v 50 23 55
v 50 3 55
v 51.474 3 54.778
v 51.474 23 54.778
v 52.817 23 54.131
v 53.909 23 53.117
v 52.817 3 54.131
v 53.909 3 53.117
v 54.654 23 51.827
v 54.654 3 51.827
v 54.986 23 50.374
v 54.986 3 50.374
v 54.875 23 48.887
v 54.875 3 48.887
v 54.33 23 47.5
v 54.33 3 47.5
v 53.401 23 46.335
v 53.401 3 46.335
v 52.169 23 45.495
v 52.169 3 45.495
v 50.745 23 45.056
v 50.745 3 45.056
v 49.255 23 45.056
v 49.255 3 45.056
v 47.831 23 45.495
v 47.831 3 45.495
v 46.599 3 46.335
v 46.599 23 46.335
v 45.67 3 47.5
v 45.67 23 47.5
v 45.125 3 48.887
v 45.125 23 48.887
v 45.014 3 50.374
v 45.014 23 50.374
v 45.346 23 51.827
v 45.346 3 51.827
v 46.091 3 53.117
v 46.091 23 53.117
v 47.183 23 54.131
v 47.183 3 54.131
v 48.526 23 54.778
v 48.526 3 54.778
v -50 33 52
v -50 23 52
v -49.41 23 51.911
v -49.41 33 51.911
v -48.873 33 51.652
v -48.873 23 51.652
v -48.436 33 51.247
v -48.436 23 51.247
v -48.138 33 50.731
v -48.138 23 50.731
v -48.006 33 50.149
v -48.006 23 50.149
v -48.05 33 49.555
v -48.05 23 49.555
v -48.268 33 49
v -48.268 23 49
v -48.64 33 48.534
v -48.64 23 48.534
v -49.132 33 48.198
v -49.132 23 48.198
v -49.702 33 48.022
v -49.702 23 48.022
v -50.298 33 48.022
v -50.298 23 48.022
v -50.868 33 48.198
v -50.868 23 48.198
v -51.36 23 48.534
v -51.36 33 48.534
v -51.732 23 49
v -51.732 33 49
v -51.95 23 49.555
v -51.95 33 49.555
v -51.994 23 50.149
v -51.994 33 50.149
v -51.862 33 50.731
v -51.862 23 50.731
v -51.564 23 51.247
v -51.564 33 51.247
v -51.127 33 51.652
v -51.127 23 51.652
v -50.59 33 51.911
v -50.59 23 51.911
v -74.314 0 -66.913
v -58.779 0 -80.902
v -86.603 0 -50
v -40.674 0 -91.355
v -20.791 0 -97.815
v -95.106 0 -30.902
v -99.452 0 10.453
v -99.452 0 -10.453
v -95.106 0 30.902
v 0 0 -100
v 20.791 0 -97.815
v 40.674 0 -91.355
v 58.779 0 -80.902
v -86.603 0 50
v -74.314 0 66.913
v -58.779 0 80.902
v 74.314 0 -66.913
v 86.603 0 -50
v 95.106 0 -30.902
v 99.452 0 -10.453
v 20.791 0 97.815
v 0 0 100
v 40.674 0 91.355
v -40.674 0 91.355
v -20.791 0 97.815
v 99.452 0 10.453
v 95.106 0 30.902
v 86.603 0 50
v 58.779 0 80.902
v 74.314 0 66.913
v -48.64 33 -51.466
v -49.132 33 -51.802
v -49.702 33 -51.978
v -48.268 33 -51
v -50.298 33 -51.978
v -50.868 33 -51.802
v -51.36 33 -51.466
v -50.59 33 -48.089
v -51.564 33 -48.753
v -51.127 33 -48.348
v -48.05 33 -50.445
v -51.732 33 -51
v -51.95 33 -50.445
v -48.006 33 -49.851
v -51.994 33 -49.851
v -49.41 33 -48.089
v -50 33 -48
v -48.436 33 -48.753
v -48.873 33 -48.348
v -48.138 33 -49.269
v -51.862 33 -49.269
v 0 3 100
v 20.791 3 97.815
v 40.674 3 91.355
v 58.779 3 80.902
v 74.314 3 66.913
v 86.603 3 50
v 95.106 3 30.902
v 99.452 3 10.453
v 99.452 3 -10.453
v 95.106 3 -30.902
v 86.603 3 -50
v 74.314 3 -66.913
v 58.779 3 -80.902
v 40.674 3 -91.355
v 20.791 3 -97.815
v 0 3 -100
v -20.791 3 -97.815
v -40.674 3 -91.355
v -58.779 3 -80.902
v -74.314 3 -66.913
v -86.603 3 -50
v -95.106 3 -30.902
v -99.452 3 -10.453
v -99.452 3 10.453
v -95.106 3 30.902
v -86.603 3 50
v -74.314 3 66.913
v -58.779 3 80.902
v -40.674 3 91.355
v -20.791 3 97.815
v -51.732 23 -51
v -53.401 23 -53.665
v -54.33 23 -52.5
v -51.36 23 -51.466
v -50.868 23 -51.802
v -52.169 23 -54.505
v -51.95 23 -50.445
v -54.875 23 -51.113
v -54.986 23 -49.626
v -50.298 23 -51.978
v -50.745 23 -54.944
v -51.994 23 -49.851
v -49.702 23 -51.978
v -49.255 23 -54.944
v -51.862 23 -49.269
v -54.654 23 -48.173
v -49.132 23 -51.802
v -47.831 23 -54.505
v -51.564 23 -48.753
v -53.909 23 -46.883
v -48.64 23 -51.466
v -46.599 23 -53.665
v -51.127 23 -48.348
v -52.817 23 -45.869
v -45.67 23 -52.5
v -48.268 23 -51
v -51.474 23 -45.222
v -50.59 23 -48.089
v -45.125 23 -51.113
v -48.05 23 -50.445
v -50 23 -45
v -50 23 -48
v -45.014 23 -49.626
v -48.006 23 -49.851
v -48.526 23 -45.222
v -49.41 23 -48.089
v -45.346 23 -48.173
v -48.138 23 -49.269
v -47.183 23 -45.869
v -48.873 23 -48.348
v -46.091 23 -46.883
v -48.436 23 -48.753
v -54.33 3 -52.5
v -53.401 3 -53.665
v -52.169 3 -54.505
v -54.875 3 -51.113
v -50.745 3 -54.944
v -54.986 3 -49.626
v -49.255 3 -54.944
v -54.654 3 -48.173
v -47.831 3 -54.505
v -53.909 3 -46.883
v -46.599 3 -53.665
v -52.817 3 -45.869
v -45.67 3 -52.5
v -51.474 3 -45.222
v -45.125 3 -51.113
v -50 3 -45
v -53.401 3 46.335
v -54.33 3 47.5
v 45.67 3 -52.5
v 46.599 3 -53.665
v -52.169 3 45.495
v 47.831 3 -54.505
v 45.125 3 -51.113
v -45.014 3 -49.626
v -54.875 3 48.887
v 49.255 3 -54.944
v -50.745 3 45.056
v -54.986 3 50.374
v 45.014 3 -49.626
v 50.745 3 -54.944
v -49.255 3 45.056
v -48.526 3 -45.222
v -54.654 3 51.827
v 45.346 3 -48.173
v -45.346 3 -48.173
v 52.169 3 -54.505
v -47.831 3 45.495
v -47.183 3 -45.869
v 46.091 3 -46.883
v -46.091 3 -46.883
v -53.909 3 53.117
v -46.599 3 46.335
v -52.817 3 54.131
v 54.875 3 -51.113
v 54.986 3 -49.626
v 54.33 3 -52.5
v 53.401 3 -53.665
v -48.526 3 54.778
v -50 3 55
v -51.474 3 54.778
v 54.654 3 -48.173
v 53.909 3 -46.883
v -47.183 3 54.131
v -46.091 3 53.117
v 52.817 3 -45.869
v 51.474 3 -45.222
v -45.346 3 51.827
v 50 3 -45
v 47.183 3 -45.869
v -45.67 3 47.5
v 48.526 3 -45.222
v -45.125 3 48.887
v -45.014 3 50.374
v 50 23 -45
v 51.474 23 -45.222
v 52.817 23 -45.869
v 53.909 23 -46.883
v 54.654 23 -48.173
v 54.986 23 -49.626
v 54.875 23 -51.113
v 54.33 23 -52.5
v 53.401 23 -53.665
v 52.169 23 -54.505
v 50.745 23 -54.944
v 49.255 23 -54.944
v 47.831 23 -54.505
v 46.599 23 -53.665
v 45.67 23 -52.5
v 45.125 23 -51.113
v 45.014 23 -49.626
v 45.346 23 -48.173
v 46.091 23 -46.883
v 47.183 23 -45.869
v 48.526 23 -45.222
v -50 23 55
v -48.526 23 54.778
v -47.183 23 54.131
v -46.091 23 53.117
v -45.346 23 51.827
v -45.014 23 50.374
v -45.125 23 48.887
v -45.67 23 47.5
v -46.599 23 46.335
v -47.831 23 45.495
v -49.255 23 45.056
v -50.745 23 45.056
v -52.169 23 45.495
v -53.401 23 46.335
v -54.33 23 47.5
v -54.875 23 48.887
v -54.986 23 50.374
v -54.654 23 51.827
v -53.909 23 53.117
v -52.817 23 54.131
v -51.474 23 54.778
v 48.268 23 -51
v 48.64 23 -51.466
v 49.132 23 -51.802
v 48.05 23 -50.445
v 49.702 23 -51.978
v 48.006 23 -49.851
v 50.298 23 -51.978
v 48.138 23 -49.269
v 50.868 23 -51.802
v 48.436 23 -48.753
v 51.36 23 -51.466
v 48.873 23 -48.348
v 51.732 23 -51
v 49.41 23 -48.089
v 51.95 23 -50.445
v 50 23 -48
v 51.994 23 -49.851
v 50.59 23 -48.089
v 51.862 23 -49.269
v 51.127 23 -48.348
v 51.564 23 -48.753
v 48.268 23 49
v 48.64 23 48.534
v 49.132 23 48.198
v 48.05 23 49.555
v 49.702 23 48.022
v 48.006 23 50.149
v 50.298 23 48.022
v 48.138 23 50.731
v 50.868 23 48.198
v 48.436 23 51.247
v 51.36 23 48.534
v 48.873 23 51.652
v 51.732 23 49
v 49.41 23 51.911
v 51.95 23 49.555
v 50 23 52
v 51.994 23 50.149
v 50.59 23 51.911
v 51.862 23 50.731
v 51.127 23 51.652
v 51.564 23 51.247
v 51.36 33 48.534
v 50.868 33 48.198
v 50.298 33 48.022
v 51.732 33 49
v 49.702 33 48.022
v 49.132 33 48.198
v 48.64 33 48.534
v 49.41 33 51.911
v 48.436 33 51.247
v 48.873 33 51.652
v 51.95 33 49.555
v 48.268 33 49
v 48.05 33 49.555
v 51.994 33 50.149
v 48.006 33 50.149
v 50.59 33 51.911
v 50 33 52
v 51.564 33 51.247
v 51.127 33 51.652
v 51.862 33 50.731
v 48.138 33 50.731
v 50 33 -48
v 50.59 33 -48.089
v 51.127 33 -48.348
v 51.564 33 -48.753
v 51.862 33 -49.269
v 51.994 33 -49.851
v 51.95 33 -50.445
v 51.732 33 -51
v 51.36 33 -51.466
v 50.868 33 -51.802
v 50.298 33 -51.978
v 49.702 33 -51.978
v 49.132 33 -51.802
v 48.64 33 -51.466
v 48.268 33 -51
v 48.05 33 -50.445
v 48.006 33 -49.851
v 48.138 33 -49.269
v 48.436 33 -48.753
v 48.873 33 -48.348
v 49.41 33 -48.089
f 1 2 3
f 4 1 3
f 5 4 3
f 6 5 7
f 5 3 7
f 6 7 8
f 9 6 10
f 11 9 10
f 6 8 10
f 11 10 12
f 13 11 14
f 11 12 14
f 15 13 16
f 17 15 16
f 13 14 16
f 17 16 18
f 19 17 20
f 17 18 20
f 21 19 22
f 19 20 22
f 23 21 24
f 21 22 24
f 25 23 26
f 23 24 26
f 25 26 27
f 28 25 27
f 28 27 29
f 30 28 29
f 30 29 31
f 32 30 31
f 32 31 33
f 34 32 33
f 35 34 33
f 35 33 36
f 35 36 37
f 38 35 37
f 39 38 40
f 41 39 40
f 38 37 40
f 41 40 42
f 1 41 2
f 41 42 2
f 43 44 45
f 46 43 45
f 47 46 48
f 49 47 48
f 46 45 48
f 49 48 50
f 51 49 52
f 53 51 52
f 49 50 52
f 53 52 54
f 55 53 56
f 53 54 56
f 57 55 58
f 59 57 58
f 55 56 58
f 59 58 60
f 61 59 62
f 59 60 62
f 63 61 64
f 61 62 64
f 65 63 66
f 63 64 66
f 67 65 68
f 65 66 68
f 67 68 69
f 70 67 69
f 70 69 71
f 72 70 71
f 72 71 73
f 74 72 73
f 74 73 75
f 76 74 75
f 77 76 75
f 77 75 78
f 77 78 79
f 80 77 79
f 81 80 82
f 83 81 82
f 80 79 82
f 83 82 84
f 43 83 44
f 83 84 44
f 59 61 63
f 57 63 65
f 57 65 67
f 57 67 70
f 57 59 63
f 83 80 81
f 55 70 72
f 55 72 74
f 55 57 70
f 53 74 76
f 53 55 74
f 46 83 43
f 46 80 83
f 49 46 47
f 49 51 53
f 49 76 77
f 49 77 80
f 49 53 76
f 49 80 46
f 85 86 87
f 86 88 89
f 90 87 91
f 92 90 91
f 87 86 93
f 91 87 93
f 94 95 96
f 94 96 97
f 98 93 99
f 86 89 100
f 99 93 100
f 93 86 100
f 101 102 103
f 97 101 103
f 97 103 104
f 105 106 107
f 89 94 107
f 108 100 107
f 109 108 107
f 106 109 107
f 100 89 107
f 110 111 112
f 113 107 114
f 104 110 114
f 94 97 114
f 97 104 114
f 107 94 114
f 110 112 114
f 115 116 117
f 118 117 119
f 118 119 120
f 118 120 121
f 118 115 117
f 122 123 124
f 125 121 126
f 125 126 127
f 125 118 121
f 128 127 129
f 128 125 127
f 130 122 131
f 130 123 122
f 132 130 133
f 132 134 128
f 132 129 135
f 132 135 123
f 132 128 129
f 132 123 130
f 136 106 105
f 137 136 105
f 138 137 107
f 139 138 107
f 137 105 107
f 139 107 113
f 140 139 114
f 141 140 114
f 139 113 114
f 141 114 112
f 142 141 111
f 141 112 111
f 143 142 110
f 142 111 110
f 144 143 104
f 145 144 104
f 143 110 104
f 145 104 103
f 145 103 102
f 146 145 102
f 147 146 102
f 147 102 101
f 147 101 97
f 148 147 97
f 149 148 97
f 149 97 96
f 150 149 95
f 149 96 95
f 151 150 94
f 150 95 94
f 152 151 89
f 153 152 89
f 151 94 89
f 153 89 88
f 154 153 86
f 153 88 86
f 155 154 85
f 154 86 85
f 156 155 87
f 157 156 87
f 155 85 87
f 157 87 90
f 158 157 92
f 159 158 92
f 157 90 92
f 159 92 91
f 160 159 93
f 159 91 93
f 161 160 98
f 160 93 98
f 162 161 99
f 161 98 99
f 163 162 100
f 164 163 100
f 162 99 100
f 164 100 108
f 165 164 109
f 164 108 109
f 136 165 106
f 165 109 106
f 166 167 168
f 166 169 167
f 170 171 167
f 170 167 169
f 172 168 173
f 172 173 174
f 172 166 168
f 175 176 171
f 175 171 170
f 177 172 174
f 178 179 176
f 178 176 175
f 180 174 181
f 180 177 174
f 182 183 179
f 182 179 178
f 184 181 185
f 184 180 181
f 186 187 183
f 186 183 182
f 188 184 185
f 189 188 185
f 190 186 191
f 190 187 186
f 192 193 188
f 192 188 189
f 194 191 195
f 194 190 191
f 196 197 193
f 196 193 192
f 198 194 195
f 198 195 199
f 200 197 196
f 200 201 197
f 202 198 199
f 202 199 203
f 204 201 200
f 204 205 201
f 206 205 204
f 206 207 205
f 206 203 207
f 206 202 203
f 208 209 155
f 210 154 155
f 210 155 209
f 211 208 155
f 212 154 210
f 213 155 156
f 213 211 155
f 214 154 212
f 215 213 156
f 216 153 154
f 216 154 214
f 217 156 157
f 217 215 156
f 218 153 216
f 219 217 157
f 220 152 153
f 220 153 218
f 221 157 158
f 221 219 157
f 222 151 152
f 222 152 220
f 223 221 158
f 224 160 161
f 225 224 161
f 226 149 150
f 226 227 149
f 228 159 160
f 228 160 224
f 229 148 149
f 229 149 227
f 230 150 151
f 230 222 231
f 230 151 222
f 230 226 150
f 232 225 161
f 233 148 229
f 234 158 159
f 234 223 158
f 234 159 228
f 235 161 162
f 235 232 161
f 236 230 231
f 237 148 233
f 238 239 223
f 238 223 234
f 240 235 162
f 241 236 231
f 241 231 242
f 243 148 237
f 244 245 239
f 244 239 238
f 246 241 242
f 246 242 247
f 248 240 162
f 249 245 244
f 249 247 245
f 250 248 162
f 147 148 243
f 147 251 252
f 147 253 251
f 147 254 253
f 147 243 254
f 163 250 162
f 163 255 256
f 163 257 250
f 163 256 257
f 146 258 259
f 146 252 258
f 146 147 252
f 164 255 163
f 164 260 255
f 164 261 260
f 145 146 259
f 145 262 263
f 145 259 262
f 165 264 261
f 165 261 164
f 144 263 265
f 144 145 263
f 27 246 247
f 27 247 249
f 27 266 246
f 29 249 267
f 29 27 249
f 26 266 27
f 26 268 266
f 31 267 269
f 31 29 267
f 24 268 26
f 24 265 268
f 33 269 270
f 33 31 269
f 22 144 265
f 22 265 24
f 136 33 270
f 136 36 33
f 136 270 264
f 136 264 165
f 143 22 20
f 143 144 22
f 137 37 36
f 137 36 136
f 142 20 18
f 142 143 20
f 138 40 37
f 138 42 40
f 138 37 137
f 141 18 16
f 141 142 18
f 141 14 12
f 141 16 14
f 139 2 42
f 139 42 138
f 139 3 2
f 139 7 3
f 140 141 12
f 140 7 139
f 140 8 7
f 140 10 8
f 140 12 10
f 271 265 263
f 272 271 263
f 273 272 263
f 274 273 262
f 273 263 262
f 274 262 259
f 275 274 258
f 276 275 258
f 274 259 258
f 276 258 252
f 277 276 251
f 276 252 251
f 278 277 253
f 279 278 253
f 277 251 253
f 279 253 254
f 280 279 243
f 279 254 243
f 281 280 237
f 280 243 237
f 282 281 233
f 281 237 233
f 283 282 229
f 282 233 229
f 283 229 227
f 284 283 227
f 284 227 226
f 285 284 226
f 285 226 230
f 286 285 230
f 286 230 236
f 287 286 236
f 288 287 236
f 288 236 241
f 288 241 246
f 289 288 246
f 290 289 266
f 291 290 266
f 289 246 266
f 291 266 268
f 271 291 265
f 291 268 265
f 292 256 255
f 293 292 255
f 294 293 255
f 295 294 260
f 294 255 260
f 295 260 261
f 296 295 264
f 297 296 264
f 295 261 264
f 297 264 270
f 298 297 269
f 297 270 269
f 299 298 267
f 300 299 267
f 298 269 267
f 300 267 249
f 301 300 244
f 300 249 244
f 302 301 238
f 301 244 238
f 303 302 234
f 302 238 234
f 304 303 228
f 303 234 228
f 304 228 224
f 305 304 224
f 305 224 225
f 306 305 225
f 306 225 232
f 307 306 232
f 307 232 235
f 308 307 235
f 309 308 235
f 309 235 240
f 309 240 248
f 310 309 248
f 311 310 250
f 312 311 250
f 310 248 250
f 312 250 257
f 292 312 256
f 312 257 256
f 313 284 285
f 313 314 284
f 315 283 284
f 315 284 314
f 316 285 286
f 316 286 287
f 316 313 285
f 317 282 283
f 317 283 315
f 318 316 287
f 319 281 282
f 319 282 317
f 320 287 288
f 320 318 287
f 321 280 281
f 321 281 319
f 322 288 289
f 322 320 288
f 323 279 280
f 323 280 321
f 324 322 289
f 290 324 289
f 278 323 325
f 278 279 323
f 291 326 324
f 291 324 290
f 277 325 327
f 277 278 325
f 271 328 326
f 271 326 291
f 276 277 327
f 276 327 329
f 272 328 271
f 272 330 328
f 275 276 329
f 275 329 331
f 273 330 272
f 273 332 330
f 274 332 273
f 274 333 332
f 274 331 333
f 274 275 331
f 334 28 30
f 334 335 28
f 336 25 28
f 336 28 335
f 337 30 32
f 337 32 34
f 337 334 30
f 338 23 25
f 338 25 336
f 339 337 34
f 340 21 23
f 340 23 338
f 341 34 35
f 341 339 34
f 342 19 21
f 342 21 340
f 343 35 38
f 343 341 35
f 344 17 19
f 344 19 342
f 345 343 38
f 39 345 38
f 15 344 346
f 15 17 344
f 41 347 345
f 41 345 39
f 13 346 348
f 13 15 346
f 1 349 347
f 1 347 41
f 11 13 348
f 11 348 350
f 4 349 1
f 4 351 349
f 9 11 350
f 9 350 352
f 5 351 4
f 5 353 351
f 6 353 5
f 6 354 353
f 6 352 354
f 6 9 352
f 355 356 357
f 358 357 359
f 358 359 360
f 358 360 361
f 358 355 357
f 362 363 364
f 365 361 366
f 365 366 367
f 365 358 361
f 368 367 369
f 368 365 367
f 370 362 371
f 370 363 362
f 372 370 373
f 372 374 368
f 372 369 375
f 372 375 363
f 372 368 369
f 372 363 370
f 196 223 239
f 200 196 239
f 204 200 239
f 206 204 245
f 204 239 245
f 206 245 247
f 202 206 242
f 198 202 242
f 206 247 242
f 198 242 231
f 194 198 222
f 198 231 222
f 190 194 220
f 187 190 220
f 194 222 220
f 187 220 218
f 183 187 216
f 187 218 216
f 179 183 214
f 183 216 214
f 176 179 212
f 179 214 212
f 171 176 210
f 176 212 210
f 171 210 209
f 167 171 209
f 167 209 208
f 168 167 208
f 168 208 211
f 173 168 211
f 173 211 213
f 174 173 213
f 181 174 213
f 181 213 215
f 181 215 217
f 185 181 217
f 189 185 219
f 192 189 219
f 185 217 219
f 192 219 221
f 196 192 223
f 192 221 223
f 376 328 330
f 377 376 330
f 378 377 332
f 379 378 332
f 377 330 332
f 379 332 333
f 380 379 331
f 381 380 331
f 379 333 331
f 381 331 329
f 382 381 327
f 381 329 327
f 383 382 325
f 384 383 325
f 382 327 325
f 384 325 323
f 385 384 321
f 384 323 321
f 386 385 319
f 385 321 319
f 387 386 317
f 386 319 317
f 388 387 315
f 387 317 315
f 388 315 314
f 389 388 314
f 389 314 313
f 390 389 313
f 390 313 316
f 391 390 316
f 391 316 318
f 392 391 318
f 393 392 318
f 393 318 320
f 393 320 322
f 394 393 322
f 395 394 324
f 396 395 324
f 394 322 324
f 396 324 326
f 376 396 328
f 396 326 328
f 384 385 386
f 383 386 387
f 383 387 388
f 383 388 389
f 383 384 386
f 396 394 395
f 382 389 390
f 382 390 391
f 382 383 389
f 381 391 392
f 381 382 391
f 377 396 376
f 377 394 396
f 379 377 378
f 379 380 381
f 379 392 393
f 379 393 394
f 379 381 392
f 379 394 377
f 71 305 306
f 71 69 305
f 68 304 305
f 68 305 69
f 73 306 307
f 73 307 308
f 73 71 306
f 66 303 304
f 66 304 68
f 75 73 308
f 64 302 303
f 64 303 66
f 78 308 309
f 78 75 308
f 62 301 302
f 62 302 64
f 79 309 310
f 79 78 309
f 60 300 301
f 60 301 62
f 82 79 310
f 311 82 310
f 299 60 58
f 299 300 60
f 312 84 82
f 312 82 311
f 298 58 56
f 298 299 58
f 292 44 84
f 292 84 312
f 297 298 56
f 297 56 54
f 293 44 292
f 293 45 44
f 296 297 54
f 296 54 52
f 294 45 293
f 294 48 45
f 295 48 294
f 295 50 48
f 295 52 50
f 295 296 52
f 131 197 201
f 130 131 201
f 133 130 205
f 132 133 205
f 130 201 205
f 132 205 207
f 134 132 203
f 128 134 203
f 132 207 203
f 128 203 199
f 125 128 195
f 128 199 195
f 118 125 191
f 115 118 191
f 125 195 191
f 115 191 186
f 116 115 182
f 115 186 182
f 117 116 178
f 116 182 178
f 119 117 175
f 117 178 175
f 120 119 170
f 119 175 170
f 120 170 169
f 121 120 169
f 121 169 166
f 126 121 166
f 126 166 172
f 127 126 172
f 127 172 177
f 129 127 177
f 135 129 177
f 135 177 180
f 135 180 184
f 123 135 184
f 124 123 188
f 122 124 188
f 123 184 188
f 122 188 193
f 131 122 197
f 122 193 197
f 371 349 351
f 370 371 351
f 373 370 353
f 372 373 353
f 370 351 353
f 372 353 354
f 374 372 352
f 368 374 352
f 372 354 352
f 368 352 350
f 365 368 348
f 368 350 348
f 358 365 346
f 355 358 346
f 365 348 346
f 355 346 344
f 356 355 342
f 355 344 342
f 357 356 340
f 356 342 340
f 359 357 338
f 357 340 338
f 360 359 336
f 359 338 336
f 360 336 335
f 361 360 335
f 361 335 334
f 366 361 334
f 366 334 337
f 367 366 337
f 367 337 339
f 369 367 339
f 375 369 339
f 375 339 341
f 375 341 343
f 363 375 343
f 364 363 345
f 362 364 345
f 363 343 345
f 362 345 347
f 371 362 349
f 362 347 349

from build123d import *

# Parameters (mm, degrees)
SKETCH3_R           = 100
BOSS_EXTRUDE1_DEPTH = 3
SKETCH4_R           = 5
BOSS_EXTRUDE2_DEPTH = 20
SKETCH5_R           = 2
BOSS_EXTRUDE3_DEPTH = 10


with BuildPart() as part:
    # Sketch3 → Boss-Extrude1 (new body)
    with BuildSketch(Plane(origin=(0, 0, 0), x_dir=(1, 0, 0), z_dir=(0, 1, 0))):
        with Locations(Location((0, 0, 0), (0, 0, 270))):
            Circle(SKETCH3_R)
    extrude(amount=BOSS_EXTRUDE1_DEPTH)

    # Sketch4 → Boss-Extrude2 (add)
    with BuildSketch(Plane(origin=(0, 3, 0), x_dir=(1, 0, 0), z_dir=(0, 1, 0))):
        with Locations(Location((-50, 50, 0), (0, 0, 270))):
            Circle(SKETCH4_R)
        with Locations(Location((50, 50, 0), (0, 0, 270))):
            Circle(SKETCH4_R)
        with Locations(Location((50, -50, 0), (0, 0, 270))):
            Circle(SKETCH4_R)
        with Locations(Location((-50, -50, 0), (0, 0, 270))):
            Circle(SKETCH4_R)
    extrude(amount=BOSS_EXTRUDE2_DEPTH)

    # Sketch5 → Boss-Extrude3 (add)
    with BuildSketch(Plane(origin=(0, 23, 0), x_dir=(1, 0, 0), z_dir=(0, 1, 0))):
        with Locations(Location((50, -50, 0), (0, 0, 270))):
            Circle(SKETCH5_R)
        with Locations(Location((-50, -50, 0), (0, 0, 270))):
            Circle(SKETCH5_R)
        with Locations(Location((-50, 50, 0), (0, 0, 270))):
            Circle(SKETCH5_R)
        with Locations(Location((50, 50, 0), (0, 0, 270))):
            Circle(SKETCH5_R)
    extrude(amount=BOSS_EXTRUDE3_DEPTH)


solid = part.part
